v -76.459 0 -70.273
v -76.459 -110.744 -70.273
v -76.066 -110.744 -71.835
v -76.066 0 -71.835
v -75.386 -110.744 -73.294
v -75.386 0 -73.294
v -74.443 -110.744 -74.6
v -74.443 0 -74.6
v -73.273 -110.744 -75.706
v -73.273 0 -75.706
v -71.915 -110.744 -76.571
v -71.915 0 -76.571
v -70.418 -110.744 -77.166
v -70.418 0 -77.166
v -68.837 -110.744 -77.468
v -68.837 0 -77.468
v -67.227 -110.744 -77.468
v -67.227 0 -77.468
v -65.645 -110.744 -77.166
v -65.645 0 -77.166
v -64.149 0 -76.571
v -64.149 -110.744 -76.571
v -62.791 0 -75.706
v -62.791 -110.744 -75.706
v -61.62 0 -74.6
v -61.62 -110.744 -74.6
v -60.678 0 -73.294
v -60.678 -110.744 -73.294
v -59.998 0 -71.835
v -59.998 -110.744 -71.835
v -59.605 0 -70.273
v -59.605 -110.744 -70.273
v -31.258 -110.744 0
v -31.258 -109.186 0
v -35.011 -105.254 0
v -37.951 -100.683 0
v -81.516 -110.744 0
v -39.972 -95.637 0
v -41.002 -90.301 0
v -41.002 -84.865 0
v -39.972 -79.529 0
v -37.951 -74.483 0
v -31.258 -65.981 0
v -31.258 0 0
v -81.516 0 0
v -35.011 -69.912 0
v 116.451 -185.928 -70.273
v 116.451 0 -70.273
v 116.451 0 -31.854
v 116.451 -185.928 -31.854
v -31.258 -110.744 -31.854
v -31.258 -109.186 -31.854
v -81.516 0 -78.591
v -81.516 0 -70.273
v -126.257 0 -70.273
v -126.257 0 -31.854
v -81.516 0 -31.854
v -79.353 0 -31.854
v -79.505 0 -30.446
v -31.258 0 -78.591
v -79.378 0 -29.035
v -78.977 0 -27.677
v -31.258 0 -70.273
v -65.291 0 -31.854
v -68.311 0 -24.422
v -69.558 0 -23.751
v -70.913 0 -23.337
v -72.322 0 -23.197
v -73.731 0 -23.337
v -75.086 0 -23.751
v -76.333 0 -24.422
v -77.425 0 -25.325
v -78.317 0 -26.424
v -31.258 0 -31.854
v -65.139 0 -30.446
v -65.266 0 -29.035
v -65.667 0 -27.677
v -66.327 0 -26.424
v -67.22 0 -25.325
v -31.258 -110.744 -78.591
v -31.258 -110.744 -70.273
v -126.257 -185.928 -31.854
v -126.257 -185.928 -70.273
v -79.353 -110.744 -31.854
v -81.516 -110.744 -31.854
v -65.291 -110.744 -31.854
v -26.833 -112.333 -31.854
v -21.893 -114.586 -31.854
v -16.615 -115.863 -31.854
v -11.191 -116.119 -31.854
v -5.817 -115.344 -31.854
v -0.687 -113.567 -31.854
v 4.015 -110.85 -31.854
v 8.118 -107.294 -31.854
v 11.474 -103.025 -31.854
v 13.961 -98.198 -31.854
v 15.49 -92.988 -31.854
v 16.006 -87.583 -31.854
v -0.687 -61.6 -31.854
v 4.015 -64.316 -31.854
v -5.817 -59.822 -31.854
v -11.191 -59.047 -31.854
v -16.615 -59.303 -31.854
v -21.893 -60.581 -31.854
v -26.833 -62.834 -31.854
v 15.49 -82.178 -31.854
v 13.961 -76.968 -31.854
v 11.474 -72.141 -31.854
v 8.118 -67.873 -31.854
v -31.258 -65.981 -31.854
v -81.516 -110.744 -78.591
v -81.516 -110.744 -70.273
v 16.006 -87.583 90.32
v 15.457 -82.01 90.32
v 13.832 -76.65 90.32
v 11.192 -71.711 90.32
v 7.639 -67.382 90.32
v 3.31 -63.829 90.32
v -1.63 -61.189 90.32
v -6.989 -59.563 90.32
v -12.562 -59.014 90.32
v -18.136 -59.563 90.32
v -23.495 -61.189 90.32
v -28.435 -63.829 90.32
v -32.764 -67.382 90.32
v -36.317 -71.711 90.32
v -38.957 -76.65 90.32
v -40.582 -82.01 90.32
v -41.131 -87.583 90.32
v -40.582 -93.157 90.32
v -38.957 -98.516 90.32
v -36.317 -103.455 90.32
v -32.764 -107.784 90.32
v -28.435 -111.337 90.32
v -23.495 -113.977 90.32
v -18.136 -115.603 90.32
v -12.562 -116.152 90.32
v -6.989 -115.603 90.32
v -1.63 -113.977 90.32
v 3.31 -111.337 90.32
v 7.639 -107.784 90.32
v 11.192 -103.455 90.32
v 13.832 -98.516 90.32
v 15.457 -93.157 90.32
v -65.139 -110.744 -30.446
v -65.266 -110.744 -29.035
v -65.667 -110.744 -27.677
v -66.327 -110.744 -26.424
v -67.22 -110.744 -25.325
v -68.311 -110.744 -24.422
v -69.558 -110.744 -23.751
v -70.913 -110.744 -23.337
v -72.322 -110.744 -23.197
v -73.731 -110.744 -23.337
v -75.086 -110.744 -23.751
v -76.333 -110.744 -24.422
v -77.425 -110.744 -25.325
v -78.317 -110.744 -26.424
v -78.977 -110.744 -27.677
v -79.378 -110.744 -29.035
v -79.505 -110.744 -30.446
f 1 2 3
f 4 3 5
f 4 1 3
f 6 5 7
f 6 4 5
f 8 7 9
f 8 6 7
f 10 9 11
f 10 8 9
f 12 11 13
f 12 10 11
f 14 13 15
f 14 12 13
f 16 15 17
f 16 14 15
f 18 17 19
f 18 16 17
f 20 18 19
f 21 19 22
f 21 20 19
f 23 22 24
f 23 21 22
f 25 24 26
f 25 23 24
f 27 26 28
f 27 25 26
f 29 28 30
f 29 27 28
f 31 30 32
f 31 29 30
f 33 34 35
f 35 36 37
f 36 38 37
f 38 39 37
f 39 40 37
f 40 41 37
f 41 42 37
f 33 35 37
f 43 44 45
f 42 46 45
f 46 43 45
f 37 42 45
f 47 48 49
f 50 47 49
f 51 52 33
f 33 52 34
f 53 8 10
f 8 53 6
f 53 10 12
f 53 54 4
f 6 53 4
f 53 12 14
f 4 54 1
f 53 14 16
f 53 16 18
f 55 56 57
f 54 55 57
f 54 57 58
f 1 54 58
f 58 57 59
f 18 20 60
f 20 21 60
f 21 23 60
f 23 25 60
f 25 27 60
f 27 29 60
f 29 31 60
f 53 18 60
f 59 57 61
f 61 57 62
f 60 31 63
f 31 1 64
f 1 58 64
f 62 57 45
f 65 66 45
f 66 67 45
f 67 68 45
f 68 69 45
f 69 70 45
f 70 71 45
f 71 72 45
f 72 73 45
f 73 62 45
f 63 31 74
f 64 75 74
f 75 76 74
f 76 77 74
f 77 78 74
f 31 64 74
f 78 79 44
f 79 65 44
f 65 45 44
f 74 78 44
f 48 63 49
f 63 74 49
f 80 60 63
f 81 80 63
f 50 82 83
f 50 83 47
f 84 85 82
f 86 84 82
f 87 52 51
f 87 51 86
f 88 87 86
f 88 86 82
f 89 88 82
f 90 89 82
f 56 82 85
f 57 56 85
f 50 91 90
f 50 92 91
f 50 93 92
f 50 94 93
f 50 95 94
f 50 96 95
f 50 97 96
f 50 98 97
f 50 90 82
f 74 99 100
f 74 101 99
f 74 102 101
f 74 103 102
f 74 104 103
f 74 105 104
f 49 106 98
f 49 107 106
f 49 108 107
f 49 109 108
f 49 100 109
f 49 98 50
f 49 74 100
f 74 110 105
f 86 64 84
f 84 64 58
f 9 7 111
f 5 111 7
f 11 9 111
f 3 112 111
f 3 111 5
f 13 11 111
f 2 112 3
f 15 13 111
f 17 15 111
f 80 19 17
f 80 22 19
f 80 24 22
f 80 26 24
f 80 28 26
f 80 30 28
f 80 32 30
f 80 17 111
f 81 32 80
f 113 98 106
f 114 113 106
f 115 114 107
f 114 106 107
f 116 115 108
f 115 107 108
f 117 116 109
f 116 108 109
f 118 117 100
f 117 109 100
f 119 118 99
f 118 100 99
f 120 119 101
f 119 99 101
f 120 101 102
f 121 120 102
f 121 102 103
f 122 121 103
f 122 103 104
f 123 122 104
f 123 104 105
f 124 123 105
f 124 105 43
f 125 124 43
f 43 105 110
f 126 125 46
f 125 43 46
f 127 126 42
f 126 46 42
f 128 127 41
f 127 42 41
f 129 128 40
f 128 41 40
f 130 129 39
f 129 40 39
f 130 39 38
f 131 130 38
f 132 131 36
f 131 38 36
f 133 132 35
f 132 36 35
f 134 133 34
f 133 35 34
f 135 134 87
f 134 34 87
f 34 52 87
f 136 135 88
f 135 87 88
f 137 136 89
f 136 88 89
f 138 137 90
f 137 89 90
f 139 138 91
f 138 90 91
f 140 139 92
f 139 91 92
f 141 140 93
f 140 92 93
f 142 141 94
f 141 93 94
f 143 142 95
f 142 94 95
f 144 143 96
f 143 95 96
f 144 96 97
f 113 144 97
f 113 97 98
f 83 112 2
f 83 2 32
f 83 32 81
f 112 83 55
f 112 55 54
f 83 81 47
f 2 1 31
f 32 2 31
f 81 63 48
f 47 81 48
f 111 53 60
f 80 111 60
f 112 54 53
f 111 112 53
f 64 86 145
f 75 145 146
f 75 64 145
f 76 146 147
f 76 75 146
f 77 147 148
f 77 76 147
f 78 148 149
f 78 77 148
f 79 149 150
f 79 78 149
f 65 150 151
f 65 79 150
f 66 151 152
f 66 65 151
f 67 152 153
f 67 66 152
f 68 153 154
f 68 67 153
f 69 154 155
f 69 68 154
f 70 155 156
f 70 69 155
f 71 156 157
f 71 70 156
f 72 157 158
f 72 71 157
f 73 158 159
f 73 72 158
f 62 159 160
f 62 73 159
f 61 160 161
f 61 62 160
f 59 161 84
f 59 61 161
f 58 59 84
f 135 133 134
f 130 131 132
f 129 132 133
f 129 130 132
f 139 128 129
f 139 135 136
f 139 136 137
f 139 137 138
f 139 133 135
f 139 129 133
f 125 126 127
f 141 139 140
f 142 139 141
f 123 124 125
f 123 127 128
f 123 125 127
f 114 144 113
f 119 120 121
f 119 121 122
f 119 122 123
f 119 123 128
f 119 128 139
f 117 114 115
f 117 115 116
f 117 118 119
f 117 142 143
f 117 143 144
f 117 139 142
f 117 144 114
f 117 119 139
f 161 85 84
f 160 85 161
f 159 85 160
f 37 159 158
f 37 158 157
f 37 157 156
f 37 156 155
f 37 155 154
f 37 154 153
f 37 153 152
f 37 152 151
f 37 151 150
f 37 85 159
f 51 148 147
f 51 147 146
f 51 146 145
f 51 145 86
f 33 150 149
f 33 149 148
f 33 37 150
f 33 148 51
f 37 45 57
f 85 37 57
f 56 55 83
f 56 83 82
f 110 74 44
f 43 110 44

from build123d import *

# Parameters (mm, degrees)
F0_W     = 242.7079752088
F0_H     = 38.4193509817
F1_DEPTH = 185.928
F2_R     = 28.5688993419
F3_DEPTH = 122.174
F4_R     = 8.5256392181
F4_R_2   = 7.1835260989
F4_R_3   = 5.0238918194
F5_DEPTH = 110.744


with BuildPart() as f1:
    # F0 (on Front) → F1 (new body)
    with BuildSketch(Plane.XZ):
        with Locations((-4.9031935632, -51.0637238622)):
            Rectangle(F0_W, F0_H)
    extrude(amount=F1_DEPTH)

    # F2 (on face) → F3 (join)
    with BuildSketch(Plane.XY.offset(-31.8540483713)):
        with Locations((-12.5624807552, -87.5830799341)):
            Circle(F2_R)
    extrude(amount=F3_DEPTH)

    # F4 (on Front) → F5 (join)
    with BuildSketch(Plane.XZ):
        with BuildLine():
            Line((-31.2578417361, 0), (-81.515558064, 0))
            Line((-81.515558064, 0), (-81.515558064, -78.5908699036))
            Line((-81.515558064, -78.5908699036), (-31.2578417361, -78.5908699036))
            Line((-31.2578417361, -78.5908699036), (-31.2578417361, -68.2470542583))
            ThreePointArc((-31.2578417361, -68.2470542583), (-54.1109280597, -64.0015229583), (-31.2578417361, -59.7559916582))
            Line((-31.2578417361, -59.7559916582), (-31.2578417361, 0))
        make_face()
        with Locations((-68.0317804217, -68.9809322357)):
            Circle(F4_R, mode=Mode.SUBTRACT)
        with Locations((-72.3220780492, -30.3810052574)):
            Circle(F4_R_2, mode=Mode.SUBTRACT)
        with Locations((-47.1932142973, -37.2236035764)):
            Circle(F4_R_3, mode=Mode.SUBTRACT)
        with BuildLine():
            ThreePointArc((-30.4691283096, -64.0015229583), (-30.6679791986, -61.8424372207), (-31.2578417361, -59.7559916582))
            Line((-31.2578417361, -59.7559916582), (-31.2578417361, -68.2470542583))
            ThreePointArc((-31.2578417361, -68.2470542583), (-30.6679791986, -66.1606086959), (-30.4691283096, -64.0015229583))
        make_face()
        with BuildLine():
            Line((-31.2578417361, -68.2470542583), (-31.2578417361, -59.7559916582))
            ThreePointArc((-31.2578417361, -59.7559916582), (-54.1109280597, -64.0015229583), (-31.2578417361, -68.2470542583))
        make_face()
    extrude(amount=F5_DEPTH)


solid = f1.part
